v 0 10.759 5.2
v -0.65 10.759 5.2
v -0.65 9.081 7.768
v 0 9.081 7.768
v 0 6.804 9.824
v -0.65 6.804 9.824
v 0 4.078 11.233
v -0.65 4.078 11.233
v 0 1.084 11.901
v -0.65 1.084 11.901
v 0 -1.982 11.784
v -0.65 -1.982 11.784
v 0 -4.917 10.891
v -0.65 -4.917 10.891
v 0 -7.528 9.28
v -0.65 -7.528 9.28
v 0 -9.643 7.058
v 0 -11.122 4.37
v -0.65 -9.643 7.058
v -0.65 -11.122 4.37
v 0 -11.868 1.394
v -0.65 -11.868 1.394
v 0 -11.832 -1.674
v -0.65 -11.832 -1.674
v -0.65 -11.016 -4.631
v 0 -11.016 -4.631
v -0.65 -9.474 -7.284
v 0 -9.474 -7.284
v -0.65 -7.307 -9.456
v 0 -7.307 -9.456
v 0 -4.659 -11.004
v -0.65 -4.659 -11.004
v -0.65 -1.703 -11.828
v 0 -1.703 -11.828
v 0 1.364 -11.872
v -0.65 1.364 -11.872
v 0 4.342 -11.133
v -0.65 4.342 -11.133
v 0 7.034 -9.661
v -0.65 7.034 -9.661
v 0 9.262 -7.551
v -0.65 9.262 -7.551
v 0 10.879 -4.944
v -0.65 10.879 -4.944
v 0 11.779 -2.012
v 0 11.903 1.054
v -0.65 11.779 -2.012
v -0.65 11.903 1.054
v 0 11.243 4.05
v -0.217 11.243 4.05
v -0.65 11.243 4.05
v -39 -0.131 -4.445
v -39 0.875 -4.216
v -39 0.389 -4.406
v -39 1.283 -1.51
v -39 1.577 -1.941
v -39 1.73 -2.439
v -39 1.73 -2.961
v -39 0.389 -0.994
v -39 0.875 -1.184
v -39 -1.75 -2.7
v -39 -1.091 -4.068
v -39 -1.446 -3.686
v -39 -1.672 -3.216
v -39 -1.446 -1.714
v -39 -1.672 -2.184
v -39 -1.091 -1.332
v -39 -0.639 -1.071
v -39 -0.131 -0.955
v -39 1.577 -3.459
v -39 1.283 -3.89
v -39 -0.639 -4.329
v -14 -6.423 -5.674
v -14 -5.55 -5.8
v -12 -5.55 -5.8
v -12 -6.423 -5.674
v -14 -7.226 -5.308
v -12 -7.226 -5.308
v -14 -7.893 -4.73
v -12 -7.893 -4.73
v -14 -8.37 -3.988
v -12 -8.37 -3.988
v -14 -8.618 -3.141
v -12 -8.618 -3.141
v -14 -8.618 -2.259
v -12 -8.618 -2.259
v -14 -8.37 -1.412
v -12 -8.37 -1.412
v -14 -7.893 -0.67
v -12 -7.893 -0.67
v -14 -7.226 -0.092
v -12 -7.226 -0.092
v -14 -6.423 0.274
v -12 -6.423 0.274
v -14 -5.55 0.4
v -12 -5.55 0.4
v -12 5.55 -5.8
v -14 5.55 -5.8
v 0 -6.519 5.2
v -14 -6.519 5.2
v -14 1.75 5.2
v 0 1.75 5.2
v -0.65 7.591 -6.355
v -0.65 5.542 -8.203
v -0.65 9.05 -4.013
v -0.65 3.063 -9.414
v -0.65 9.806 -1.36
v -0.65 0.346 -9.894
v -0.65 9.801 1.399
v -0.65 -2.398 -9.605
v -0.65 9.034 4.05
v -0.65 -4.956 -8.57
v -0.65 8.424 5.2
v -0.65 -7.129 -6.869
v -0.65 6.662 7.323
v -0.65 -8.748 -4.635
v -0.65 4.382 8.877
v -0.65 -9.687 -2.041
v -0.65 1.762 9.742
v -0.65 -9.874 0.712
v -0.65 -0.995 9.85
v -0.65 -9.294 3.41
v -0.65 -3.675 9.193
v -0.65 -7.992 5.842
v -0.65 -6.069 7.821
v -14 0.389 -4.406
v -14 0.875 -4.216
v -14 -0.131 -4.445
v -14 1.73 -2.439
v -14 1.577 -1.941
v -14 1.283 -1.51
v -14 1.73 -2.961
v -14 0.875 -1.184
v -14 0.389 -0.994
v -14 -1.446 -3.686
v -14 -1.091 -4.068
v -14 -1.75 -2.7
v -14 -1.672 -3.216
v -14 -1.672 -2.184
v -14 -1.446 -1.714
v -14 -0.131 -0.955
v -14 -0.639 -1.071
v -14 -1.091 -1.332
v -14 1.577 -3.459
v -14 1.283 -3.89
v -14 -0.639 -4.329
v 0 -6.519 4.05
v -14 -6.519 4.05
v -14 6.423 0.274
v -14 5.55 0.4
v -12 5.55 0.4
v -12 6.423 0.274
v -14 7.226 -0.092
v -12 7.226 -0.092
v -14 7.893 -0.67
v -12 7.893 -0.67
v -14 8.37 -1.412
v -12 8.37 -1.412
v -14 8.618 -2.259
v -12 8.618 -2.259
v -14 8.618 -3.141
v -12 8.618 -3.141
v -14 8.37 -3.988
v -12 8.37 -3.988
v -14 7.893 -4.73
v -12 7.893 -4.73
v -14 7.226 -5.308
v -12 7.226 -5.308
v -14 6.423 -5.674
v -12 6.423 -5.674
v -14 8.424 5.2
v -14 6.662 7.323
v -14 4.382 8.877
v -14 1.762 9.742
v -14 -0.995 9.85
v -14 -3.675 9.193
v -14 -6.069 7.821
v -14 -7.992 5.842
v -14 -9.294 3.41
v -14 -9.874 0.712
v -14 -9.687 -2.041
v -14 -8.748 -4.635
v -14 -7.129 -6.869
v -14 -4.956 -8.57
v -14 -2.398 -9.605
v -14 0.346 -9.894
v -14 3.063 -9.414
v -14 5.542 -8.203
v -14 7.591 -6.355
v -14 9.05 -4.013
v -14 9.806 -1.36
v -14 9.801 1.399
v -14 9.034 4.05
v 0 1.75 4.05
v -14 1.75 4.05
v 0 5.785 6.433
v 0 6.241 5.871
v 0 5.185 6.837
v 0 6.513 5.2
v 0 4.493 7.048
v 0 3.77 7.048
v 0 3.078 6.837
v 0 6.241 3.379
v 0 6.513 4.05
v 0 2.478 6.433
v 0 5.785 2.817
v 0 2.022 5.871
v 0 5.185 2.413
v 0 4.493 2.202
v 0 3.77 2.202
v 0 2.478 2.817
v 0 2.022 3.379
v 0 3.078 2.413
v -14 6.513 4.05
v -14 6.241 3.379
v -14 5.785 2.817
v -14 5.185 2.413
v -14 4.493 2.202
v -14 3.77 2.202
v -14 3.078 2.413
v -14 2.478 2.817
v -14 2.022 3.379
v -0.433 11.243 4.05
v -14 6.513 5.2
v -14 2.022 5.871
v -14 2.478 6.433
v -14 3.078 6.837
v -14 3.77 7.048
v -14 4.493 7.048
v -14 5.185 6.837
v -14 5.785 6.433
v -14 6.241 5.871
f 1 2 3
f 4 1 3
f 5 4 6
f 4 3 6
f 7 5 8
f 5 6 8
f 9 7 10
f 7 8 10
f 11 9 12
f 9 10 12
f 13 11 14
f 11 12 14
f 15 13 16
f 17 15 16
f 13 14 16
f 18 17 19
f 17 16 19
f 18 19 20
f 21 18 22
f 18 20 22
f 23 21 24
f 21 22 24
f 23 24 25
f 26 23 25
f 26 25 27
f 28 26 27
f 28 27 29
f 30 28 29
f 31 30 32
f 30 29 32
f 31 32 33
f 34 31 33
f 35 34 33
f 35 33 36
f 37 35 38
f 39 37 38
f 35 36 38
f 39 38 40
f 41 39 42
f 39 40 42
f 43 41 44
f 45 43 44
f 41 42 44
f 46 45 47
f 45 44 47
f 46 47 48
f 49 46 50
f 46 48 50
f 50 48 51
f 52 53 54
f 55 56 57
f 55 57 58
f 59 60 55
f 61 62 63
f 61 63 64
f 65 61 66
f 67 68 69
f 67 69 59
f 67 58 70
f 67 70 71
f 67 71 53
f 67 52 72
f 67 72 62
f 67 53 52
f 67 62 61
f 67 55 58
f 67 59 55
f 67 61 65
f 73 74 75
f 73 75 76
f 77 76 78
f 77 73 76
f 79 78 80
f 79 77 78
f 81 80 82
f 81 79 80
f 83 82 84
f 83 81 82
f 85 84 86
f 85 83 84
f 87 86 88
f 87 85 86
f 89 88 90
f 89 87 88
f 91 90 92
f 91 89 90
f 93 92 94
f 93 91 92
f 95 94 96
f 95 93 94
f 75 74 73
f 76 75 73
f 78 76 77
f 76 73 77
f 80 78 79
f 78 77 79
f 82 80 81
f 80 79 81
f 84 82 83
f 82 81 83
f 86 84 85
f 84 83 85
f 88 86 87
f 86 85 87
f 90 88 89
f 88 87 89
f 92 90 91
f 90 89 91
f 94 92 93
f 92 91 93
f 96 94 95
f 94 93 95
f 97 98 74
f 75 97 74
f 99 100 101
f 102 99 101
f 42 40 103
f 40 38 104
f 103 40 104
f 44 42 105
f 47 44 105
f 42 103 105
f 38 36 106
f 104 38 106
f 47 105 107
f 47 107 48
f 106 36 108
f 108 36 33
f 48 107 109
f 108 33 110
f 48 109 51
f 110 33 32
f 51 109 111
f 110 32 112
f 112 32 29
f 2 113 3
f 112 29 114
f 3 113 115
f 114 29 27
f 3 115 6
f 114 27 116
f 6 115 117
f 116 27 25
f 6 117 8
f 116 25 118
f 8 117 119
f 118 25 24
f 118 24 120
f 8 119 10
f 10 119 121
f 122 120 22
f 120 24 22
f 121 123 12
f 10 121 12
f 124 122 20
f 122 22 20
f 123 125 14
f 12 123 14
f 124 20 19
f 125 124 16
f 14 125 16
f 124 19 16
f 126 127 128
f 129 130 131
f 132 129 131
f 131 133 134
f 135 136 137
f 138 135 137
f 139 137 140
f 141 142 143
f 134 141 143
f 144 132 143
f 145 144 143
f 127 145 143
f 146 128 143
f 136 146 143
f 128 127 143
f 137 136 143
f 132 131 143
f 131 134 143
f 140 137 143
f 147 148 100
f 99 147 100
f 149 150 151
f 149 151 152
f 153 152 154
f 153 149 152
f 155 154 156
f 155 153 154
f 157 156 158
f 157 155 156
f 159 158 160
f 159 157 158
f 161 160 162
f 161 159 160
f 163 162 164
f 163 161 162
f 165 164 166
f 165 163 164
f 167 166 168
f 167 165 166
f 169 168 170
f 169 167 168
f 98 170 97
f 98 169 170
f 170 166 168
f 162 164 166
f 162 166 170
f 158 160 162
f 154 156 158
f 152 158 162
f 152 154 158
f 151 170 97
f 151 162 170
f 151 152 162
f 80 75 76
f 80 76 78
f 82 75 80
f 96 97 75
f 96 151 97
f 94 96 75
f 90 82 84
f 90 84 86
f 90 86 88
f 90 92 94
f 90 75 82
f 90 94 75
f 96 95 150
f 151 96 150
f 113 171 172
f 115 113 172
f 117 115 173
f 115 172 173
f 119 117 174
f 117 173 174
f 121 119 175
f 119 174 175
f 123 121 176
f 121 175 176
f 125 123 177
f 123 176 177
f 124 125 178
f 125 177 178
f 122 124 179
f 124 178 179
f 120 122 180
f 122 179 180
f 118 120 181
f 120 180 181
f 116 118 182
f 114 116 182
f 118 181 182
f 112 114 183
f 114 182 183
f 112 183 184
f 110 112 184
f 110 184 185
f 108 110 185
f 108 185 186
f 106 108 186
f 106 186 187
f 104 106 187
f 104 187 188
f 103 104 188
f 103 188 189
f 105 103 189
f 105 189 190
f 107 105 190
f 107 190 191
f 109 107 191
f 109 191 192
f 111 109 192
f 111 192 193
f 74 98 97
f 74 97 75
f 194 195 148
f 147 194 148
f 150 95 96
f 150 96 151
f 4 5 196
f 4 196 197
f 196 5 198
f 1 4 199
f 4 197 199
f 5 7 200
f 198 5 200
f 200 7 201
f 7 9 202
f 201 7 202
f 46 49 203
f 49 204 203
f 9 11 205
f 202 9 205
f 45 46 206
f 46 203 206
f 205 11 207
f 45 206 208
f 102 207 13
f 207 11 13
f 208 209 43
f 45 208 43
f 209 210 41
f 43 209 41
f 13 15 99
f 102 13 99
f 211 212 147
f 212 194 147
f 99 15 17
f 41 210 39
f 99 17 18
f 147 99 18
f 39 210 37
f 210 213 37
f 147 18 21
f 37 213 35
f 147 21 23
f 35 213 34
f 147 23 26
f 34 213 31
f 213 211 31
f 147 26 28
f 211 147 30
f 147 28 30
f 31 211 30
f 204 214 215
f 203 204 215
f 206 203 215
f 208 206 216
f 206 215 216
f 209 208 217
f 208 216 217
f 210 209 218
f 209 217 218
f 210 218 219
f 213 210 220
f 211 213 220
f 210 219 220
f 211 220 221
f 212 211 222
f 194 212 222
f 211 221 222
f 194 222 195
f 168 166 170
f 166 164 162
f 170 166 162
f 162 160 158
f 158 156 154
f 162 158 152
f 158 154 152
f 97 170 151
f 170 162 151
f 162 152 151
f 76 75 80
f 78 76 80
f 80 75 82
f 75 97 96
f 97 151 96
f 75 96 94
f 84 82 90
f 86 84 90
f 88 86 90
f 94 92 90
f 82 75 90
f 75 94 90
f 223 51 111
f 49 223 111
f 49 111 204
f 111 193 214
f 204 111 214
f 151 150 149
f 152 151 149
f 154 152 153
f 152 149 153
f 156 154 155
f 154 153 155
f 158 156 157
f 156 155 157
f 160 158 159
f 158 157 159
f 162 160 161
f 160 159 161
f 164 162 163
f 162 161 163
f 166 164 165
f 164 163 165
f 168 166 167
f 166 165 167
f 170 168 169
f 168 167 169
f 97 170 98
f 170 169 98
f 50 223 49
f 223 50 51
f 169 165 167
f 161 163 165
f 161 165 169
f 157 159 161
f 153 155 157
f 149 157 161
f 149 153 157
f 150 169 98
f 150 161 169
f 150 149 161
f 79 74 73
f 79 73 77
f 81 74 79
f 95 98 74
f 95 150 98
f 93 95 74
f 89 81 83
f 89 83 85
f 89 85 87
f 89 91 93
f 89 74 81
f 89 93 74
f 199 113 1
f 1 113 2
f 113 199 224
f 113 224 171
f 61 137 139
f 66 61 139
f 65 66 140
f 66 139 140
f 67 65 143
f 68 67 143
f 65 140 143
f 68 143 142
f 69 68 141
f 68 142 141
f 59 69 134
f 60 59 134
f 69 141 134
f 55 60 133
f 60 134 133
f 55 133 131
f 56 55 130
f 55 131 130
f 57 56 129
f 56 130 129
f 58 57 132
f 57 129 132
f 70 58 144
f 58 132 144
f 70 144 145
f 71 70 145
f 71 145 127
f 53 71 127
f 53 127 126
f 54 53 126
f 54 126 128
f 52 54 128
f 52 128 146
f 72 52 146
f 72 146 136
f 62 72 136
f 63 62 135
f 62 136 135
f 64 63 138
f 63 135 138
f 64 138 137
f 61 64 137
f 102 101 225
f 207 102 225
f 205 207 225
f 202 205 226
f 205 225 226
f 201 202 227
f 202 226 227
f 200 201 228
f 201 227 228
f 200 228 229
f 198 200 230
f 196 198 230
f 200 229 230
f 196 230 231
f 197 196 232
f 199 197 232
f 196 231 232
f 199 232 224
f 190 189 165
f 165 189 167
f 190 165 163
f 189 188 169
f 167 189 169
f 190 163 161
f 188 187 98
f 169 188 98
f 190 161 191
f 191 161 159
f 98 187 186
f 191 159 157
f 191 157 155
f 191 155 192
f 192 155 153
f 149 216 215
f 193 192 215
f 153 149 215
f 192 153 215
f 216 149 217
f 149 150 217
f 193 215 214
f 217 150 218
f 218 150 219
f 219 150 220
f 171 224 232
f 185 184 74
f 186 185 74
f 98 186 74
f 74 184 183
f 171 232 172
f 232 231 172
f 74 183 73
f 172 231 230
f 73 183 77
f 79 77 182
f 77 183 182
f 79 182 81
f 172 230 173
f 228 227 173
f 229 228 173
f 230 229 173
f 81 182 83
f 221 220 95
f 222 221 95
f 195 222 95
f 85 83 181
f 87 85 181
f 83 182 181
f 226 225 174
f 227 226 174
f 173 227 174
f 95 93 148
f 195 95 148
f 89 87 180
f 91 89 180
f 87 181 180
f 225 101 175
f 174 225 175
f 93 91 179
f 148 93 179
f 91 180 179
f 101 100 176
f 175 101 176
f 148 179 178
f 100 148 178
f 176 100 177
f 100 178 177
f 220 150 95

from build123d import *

# Parameters (mm, degrees)
F3_DEPTH = 14.001
F4_DEPTH = 14.001
F6_DEPTH = 2
F7_DEPTH = 2
F8_R     = 1.75
F9_DEPTH = 25


with BuildPart() as f1:
    # F0 (on Front) → F1 (revolve)
    with BuildSketch(Plane.XZ):
        Polygon((-14, 0), (0, 0), (0, 11.95), (-0.65, 11.95), (-0.65, 9.9), (-14, 9.9), align=None)
    revolve(axis=Axis((-7, 0, 0), (1, 0, 0)))

    # F2 (on face) → F3 (cut, through all)
    with BuildSketch(Plane(origin=(-14, 0, 0), x_dir=(0, -1, 0), z_dir=(-1, 0, 0))):
        with BuildLine():
            Line((6.518706, 5.2), (-1.75, 5.2))
            ThreePointArc((-1.75, 5.2), (-4.13157, 7.075), (-6.51314, 5.2))
            Line((-6.51314, 5.2), (-11.242775, 5.2))
            Line((-11.242775, 5.2), (-11.242775, 4.05))
            Line((-11.242775, 4.05), (-6.51314, 4.05))
            ThreePointArc((-6.51314, 4.05), (-4.13157, 2.175), (-1.75, 4.05))
            Line((-1.75, 4.05), (6.518706, 4.05))
            Line((6.518706, 4.05), (6.518706, 5.2))
        make_face()
    extrude(amount=-F3_DEPTH, mode=Mode.SUBTRACT)

    # F2 (on face) → F4 (cut, through all)
    with BuildSketch(Plane(origin=(-14, 0, 0), x_dir=(0, -1, 0), z_dir=(-1, 0, 0))):
        with BuildLine():
            Line((6.518706, 5.2), (-1.75, 5.2))
            ThreePointArc((-1.75, 5.2), (-4.13157, 7.075), (-6.51314, 5.2))
            Line((-6.51314, 5.2), (-11.242775, 5.2))
            Line((-11.242775, 5.2), (-11.242775, 4.05))
            Line((-11.242775, 4.05), (-6.51314, 4.05))
            ThreePointArc((-6.51314, 4.05), (-4.13157, 2.175), (-1.75, 4.05))
            Line((-1.75, 4.05), (6.518706, 4.05))
            Line((6.518706, 4.05), (6.518706, 5.2))
        make_face()
    extrude(amount=-F4_DEPTH, mode=Mode.SUBTRACT)

    # F5 (on face) → F6 (cut)
    with BuildSketch(Plane(origin=(-14, 0, 0), x_dir=(0, -1, 0), z_dir=(-1, 0, 0))):
        with BuildLine():
            ThreePointArc((5.55, -5.8), (8.65, -2.7), (5.55, 0.4))
            Line((5.55, 0.4), (-5.55, 0.4))
            ThreePointArc((-5.55, 0.4), (-8.65, -2.7), (-5.55, -5.8))
            Line((-5.55, -5.8), (5.55, -5.8))
        make_face()
    extrude(amount=-F6_DEPTH, mode=Mode.SUBTRACT)


with BuildPart() as f7:
    # F5 (on face) → F7 (new body, through all)
    with BuildSketch(Plane(origin=(-14, 0, 0), x_dir=(0, -1, 0), z_dir=(-1, 0, 0))):
        with BuildLine():
            ThreePointArc((5.55, -5.8), (8.65, -2.7), (5.55, 0.4))
            Line((5.55, 0.4), (-5.55, 0.4))
            ThreePointArc((-5.55, 0.4), (-8.65, -2.7), (-5.55, -5.8))
            Line((-5.55, -5.8), (5.55, -5.8))
        make_face()
    extrude(amount=-F7_DEPTH)


with BuildPart() as f9:
    # F8 (on face) → F9 (new body)
    with BuildSketch(Plane(origin=(-14, 0, 0), x_dir=(0, -1, 0), z_dir=(-1, 0, 0))):
        with Locations((0, -2.7)):
            Circle(F8_R)
    extrude(amount=F9_DEPTH)


solid = Compound([f1.part, f7.part, f9.part])
